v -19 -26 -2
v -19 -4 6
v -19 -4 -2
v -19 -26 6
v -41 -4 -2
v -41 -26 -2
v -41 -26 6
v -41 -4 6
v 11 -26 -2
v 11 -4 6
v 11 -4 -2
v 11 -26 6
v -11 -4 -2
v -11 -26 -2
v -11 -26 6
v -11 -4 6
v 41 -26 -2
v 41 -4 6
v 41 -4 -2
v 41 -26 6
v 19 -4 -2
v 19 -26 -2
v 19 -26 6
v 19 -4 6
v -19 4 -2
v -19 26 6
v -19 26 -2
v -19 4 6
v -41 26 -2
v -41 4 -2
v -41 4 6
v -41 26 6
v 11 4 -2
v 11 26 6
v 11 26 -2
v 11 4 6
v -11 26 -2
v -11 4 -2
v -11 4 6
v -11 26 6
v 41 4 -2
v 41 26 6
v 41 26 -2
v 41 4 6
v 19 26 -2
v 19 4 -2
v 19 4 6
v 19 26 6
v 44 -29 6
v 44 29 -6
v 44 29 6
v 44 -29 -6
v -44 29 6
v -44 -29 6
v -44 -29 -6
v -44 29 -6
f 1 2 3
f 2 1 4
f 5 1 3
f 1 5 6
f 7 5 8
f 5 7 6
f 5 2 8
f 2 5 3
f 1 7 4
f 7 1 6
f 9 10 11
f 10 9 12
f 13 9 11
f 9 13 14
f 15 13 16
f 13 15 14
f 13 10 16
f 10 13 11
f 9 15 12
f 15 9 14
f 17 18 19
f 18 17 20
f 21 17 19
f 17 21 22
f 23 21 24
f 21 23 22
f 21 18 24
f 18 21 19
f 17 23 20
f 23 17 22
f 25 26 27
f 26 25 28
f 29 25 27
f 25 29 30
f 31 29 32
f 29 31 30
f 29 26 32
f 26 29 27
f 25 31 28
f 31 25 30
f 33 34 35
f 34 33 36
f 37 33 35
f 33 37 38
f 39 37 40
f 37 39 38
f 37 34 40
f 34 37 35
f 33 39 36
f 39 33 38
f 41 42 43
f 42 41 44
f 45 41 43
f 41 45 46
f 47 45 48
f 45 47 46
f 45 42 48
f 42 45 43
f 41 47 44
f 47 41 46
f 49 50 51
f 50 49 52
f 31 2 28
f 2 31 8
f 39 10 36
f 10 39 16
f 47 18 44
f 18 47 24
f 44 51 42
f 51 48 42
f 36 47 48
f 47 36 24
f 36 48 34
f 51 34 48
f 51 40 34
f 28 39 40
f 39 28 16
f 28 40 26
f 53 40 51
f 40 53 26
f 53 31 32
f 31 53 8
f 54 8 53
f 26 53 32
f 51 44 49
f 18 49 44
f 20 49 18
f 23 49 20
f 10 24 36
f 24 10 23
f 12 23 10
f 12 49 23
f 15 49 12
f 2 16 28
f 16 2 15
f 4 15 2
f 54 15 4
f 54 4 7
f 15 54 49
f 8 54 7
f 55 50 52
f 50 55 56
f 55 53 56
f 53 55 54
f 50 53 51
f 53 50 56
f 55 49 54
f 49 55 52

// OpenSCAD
$fn = 32;

// ----------------------------------------------------------------------
// Pocket plate 88 x 58 x 12
// 2 x 3 pockets 22 mm square, 8 mm deep
// ----------------------------------------------------------------------

// --- parameters (mm) ---
thickness = 12;  // plate thickness
floor_t = 4;     // material left under each pocket
pocket = 22;     // pocket side length
pitch_x = 30;    // pocket pitch along X
pitch_y = 30;    // pocket pitch along Y
cols = 3;        // pockets per row
rows = 2;        // rows of pockets

// --- derived feature positions (mm) ---
depth = thickness - floor_t;        // = 8   pocket depth, down to the floor
span_x = (cols - 1) * pitch_x;      // = 60   distance between outer pockets
span_y = (rows - 1) * pitch_y;      // = 30   distance between outer pocket rows
origin_x = -span_x / 2;             // = -30   X of the first pocket
origin_y = -span_y / 2;             // = -15   Y of the first pocket
plate = [span_x + pocket + 6, span_y + pocket + 6, thickness];  // = [88, 58, 12]   overall size: pockets plus 3 mm of wall on each side
feature_centers = [
  [origin_x + 0 * pitch_x, origin_y + 0 * pitch_y],
  [origin_x + 1 * pitch_x, origin_y + 0 * pitch_y],
  [origin_x + 2 * pitch_x, origin_y + 0 * pitch_y],
  [origin_x + 0 * pitch_x, origin_y + 1 * pitch_y],
  [origin_x + 1 * pitch_x, origin_y + 1 * pitch_y],
  [origin_x + 2 * pitch_x, origin_y + 1 * pitch_y]
];   // pocket centres, used verbatim by the cutter loop

// plate outline, then one pocket per centre in feature_centers
difference() {
  cube(plate, center = true);
  for (centre = feature_centers)
    translate([centre[0] - pocket / 2, centre[1] - pocket / 2, plate[2] / 2 - depth])
      cube([pocket, pocket, depth + 1]);  // centred on the declared pocket centre
}
